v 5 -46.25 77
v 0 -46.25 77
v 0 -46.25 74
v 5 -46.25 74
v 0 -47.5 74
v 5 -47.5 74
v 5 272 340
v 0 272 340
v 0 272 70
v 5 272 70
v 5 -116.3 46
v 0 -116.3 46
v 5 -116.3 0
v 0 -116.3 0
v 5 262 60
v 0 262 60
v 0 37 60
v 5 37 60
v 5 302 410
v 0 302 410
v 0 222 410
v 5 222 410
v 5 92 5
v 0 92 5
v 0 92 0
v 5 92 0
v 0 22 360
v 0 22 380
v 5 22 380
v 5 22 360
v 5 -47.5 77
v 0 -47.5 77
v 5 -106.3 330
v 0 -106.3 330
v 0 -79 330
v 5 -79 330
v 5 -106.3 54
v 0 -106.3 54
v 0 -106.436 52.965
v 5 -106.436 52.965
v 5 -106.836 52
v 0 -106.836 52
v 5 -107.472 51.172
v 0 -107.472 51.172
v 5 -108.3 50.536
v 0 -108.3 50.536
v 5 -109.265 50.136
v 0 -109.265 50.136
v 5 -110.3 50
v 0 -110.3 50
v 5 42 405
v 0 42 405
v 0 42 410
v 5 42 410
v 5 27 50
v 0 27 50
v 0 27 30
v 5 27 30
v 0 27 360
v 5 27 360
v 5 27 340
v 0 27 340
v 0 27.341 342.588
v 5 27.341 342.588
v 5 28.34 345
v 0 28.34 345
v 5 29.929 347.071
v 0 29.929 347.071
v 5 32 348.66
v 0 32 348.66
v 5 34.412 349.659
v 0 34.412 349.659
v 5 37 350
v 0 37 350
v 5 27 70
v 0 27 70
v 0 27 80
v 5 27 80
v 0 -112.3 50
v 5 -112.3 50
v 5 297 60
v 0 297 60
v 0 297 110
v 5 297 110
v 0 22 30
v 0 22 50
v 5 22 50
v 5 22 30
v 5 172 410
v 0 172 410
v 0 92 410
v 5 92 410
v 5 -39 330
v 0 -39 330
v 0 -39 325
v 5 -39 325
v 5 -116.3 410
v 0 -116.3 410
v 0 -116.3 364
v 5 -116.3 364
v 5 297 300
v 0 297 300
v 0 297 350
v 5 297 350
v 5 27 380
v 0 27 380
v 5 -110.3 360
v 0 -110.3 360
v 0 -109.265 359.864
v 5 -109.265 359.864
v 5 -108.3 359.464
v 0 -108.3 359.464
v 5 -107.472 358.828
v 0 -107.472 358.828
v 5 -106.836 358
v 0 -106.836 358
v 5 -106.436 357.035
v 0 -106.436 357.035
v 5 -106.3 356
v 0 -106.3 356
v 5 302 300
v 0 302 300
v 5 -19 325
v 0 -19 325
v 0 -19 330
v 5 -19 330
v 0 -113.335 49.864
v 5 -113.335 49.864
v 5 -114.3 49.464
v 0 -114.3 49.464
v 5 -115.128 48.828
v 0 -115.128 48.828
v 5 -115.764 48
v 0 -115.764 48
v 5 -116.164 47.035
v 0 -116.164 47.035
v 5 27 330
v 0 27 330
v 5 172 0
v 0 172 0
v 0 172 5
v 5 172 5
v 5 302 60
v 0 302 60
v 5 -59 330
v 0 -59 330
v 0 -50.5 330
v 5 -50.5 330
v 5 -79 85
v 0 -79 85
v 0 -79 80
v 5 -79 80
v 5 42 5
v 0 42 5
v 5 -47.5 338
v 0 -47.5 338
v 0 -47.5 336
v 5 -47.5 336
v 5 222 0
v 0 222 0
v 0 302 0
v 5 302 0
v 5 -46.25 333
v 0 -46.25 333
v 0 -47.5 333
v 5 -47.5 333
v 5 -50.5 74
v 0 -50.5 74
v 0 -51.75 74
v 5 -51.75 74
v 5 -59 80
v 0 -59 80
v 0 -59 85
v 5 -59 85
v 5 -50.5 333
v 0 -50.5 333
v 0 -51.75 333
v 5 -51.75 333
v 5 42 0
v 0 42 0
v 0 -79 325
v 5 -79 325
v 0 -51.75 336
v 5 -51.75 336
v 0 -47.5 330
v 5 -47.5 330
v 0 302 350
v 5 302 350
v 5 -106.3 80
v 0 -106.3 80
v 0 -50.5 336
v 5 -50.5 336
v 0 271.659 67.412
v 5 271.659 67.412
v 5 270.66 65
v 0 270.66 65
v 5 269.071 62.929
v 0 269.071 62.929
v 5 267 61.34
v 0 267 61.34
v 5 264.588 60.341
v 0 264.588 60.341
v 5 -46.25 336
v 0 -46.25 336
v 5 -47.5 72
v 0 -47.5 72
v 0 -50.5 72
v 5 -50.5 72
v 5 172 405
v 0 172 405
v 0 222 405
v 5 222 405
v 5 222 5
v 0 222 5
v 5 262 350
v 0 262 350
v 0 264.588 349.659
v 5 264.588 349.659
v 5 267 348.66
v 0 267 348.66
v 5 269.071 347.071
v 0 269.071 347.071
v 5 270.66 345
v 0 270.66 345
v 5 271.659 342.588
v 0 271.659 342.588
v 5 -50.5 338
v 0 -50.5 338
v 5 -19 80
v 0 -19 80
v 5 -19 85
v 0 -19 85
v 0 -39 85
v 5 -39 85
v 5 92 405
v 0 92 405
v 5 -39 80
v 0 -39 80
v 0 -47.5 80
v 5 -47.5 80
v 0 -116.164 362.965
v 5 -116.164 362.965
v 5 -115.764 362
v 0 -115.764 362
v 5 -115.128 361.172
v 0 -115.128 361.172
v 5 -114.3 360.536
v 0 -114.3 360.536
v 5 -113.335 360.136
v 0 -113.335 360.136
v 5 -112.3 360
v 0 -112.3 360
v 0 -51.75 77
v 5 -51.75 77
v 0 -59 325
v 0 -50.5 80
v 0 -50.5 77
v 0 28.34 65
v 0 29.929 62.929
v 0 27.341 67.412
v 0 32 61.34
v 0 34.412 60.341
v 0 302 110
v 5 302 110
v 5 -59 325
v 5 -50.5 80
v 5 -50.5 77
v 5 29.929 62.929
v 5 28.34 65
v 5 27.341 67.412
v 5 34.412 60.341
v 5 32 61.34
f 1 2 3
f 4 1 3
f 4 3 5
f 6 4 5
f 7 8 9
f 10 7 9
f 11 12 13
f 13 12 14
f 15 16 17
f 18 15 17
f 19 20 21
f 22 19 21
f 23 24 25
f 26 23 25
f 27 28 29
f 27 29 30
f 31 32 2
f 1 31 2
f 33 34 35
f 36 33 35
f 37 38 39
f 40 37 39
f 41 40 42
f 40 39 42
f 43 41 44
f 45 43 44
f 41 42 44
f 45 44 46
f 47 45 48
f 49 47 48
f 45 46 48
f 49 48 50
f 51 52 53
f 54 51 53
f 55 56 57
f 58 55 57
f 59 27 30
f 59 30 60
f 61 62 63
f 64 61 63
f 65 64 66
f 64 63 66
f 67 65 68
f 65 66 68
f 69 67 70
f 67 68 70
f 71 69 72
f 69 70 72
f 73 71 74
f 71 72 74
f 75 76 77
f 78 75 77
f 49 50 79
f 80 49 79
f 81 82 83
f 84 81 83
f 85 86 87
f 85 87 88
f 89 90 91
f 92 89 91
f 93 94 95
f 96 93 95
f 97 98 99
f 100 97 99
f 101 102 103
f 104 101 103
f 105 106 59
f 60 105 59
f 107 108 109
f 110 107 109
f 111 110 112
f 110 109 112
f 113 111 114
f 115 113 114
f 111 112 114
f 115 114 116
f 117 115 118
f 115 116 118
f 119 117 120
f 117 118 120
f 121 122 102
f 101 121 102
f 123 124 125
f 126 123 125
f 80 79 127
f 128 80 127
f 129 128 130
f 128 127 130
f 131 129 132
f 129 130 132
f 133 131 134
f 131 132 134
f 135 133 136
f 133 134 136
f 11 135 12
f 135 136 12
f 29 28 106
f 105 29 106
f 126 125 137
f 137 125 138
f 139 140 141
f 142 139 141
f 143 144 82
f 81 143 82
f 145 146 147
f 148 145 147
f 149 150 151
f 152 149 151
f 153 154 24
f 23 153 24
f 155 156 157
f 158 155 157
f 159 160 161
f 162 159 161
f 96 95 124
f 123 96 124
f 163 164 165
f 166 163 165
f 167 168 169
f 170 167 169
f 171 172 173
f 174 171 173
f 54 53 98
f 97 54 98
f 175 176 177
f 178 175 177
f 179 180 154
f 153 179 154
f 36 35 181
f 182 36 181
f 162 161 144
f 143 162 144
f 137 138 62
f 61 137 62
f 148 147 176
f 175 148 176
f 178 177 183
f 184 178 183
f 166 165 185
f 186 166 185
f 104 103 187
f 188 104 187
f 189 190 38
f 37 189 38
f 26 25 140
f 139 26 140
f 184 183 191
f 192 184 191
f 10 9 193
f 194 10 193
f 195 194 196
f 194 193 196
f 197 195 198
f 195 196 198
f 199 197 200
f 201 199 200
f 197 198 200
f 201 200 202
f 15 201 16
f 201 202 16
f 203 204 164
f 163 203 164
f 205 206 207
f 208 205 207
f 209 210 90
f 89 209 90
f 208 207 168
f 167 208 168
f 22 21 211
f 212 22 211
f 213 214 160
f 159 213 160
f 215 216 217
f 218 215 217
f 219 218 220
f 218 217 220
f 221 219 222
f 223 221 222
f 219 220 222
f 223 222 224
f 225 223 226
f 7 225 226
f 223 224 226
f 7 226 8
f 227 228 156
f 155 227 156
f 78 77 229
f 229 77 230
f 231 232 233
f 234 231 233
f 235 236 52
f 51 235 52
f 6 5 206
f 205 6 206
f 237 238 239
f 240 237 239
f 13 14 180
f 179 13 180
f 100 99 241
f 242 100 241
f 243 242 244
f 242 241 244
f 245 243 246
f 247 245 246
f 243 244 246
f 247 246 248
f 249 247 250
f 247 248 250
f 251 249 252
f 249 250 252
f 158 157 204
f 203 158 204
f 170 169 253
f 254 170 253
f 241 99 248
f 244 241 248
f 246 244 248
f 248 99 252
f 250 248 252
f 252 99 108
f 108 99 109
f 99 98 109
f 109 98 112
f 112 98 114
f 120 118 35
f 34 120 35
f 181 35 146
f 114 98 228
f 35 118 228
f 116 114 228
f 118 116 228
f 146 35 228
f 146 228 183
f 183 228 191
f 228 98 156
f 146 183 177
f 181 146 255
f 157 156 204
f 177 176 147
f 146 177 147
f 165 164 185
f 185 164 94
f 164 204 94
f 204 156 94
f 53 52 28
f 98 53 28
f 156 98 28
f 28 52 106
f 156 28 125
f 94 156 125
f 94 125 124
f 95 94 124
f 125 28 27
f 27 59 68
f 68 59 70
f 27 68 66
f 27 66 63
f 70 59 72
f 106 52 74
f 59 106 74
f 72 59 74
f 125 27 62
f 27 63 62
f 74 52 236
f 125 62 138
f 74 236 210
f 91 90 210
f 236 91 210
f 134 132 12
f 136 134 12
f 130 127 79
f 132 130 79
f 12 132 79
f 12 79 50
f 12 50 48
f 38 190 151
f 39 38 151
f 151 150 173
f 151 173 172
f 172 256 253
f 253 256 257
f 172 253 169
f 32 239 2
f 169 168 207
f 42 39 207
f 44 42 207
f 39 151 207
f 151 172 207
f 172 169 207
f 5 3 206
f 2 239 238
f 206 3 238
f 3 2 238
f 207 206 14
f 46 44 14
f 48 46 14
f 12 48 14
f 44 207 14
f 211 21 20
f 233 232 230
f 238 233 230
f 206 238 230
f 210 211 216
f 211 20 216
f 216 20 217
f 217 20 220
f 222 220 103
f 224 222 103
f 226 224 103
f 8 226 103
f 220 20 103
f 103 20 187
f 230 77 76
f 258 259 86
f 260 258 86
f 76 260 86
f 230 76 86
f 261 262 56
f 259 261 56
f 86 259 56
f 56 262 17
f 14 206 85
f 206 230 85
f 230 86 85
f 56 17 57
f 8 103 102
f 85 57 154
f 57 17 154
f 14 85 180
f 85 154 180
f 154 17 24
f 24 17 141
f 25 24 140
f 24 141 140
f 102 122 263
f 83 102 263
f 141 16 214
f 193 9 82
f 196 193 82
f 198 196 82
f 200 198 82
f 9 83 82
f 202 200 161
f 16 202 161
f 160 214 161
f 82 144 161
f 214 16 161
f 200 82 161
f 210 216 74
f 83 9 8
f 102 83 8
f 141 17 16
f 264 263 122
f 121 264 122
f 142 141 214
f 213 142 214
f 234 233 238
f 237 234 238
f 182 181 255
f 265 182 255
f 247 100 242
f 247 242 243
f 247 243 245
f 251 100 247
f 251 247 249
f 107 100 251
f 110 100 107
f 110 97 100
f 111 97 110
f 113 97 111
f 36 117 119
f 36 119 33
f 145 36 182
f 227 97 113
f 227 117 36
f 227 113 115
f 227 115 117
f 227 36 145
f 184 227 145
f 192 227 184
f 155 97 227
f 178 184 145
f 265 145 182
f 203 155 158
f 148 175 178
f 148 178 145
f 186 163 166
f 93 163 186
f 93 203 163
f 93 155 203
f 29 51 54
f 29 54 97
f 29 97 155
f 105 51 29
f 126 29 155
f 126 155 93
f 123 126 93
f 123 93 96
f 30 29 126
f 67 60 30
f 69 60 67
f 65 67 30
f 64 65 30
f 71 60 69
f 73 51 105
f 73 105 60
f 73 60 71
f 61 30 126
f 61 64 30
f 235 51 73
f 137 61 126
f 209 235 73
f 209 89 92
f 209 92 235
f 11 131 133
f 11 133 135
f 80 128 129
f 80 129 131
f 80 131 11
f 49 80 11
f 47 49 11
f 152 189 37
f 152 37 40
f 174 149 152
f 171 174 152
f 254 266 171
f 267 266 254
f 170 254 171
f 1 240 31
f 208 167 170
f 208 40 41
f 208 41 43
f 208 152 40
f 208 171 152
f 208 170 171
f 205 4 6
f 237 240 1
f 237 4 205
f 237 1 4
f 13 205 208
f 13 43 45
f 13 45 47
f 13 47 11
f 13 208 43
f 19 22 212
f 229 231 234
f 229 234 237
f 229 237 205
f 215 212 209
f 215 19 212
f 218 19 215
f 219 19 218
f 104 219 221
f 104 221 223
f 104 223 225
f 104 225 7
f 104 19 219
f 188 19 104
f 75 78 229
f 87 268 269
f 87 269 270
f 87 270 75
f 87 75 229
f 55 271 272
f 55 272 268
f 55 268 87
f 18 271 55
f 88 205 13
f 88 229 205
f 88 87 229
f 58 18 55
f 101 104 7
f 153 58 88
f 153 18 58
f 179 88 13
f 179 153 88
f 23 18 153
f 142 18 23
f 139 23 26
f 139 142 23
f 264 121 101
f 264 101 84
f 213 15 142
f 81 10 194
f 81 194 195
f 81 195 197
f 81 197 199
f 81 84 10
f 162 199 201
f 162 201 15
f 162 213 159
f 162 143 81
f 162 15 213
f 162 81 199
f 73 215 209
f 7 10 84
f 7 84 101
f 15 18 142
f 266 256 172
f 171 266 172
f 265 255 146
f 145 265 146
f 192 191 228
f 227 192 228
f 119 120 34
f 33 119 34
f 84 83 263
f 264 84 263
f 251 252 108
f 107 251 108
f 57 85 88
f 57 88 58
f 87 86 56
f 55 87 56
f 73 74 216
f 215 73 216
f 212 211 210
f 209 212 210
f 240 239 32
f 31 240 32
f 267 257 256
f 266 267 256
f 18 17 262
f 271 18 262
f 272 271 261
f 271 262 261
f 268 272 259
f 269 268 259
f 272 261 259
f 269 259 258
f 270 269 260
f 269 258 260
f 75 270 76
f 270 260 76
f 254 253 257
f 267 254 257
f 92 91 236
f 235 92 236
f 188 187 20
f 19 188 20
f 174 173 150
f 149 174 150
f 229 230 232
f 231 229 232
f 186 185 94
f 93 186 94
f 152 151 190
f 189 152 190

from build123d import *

# Parameters (mm, degrees)
SKETCH_1_W      = 20
SKETCH_1_H      = 5
EXTRUDE_1_DEPTH = 5


with BuildPart() as part:
    # 草图1 → 凸台-拉伸1 (new body)
    with BuildSketch(Plane(origin=(0, 0, 0), x_dir=(0, 0, -1), z_dir=(1, 0, 0))):
        with BuildLine():
            Line((-80, 27), (-80, -19))
            Line((-80, -19), (-85, -19))
            Line((-85, -19), (-85, -39))
            Line((-85, -39), (-80, -39))
            Line((-80, -39), (-80, -47.5))
            Line((-80, -47.5), (-77, -47.5))
            Line((-77, -47.5), (-77, -46.25))
            Line((-77, -46.25), (-74, -46.25))
            Line((-74, -46.25), (-74, -47.5))
            Line((-74, -47.5), (-72, -47.5))
            Line((-72, -47.5), (-72, -50.5))
            Line((-72, -50.5), (-74, -50.5))
            Line((-74, -50.5), (-74, -51.75))
            Line((-74, -51.75), (-77, -51.75))
            Line((-77, -51.75), (-77, -50.5))
            Line((-77, -50.5), (-80, -50.5))
            Line((-80, -50.5), (-80, -59))
            Line((-80, -59), (-85, -59))
            Line((-85, -59), (-85, -79))
            Line((-85, -79), (-80, -79))
            Line((-80, -79), (-80, -90.3))
            Line((-80, -90.3), (-80, -106.3))
            Line((-80, -106.3), (-54, -106.3))
            ThreePointArc((-54, -106.3), (-51.171572875, -107.471572875), (-50, -110.3))
            Line((-50, -110.3), (-50, -112.3))
            ThreePointArc((-50, -112.3), (-48.828427125, -115.128427125), (-46, -116.3))
            Line((-46, -116.3), (0, -116.3))
            Line((0, -116.3), (0, -64.3))
            Line((0, -64.3), (0, 0))
            Line((0, 0), (0, 42))
            Line((0, 42), (-5, 42))
            Line((-5, 42), (-5, 92))
            Line((-5, 92), (0, 92))
            Line((0, 92), (0, 172))
            Line((0, 172), (-5, 172))
            Line((-5, 172), (-5, 222))
            Line((-5, 222), (0, 222))
            Line((0, 222), (0, 302))
            Line((0, 302), (-60, 302))
            Line((-60, 302), (-60, 297))
            Line((-60, 297), (-110, 297))
            Line((-110, 297), (-110, 302))
            Line((-110, 302), (-300, 302))
            Line((-300, 302), (-300, 297))
            Line((-300, 297), (-350, 297))
            Line((-350, 297), (-350, 302))
            Line((-350, 302), (-410, 302))
            Line((-410, 302), (-410, 222))
            Line((-410, 222), (-405, 222))
            Line((-405, 222), (-405, 172))
            Line((-405, 172), (-410, 172))
            Line((-410, 172), (-410, 92))
            Line((-410, 92), (-405, 92))
            Line((-405, 92), (-405, 42))
            Line((-405, 42), (-410, 42))
            Line((-410, 42), (-410, -90.3))
            Line((-410, -90.3), (-410, -116.3))
            Line((-410, -116.3), (-364, -116.3))
            ThreePointArc((-364, -116.3), (-361.171572875, -115.128427125), (-360, -112.3))
            Line((-360, -112.3), (-360, -110.3))
            ThreePointArc((-360, -110.3), (-358.828427125, -107.471572875), (-356, -106.3))
            Line((-356, -106.3), (-330, -106.3))
            Line((-330, -106.3), (-330, -90.3))
            Line((-330, -90.3), (-330, -79))
            Line((-330, -79), (-325, -79))
            Line((-325, -79), (-325, -59))
            Line((-325, -59), (-330, -59))
            Line((-330, -59), (-330, -50.5))
            Line((-330, -50.5), (-333, -50.5))
            Line((-333, -50.5), (-333, -51.75))
            Line((-333, -51.75), (-336, -51.75))
            Line((-336, -51.75), (-336, -50.5))
            Line((-336, -50.5), (-338, -50.5))
            Line((-338, -50.5), (-338, -47.5))
            Line((-338, -47.5), (-336, -47.5))
            Line((-336, -47.5), (-336, -46.25))
            Line((-336, -46.25), (-333, -46.25))
            Line((-333, -46.25), (-333, -47.5))
            Line((-333, -47.5), (-330, -47.5))
            Line((-330, -47.5), (-330, -39))
            Line((-330, -39), (-325, -39))
            Line((-325, -39), (-325, -19))
            Line((-325, -19), (-330, -19))
            Line((-330, -19), (-330, 27))
            Line((-330, 27), (-340, 27))
            ThreePointArc((-340, 27), (-347.071067812, 29.928932188), (-350, 37))
            Line((-350, 37), (-350, 262))
            ThreePointArc((-350, 262), (-347.071067812, 269.071067812), (-340, 272))
            Line((-340, 272), (-70, 272))
            ThreePointArc((-70, 272), (-62.928932188, 269.071067812), (-60, 262))
            Line((-60, 262), (-60, 37))
            ThreePointArc((-60, 37), (-62.928932188, 29.928932188), (-70, 27))
            Line((-70, 27), (-80, 27))
        make_face()
        with Locations((-40, 24.5)):
            Rectangle(SKETCH_1_W, SKETCH_1_H, mode=Mode.SUBTRACT)
        with Locations((-370, 24.5)):
            Rectangle(SKETCH_1_W, SKETCH_1_H, mode=Mode.SUBTRACT)
    extrude(amount=EXTRUDE_1_DEPTH)


solid = part.part
